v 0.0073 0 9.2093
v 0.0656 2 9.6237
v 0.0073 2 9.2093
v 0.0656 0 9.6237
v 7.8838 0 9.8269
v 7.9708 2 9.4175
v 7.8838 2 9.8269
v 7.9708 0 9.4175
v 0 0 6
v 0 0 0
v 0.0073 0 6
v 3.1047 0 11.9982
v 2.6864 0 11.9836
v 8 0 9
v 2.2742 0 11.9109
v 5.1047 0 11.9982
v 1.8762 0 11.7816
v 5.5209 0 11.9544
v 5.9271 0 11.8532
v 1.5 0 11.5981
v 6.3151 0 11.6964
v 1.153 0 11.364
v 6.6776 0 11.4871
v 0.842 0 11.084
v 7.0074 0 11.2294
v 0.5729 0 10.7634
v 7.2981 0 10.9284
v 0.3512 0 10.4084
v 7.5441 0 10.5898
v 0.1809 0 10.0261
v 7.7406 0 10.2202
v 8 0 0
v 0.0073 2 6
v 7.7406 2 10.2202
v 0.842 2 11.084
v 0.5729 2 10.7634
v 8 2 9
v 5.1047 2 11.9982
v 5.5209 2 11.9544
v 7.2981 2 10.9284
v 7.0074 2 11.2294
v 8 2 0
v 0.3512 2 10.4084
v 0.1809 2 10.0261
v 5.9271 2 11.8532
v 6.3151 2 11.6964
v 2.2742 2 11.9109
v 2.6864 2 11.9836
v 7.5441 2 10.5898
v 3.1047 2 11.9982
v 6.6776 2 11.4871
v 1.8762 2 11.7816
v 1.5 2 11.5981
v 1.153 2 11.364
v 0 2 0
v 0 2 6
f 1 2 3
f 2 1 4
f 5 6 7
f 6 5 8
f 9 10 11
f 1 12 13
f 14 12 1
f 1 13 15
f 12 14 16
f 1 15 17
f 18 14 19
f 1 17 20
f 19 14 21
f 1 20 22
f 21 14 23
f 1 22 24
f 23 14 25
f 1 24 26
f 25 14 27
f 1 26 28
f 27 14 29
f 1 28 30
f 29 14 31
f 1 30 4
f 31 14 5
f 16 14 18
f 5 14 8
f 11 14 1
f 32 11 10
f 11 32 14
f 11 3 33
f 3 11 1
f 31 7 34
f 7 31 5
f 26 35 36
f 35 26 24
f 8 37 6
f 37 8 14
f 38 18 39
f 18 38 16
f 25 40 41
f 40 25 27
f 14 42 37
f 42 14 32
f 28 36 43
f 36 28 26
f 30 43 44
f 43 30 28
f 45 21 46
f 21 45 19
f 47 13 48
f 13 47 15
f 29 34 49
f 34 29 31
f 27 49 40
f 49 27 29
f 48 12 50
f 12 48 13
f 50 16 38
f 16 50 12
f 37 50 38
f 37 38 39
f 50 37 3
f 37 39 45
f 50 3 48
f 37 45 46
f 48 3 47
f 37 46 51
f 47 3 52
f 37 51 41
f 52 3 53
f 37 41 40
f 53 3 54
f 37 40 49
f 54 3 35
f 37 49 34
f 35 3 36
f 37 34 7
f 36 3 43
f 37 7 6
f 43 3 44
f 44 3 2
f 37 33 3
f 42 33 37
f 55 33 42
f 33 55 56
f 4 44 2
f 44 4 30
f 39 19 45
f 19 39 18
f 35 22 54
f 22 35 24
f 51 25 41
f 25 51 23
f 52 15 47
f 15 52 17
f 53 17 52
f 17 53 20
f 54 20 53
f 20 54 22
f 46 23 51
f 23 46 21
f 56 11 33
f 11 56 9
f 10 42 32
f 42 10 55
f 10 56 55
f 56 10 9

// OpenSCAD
// file: const.scad
SWITCH_WIDTH = 171;
SWITCH_DEPTH = 14;
SWITCH_HEIGHT = 100;

DOCK_SLIT_WIDTH = 8;
DOCK_SLIT_DEPTH = 2;
DOCK_SLIT_HEIGHT = 12;

BACK_HOLE_WIDTH = 42;
BACK_HOLE_HEIGHT = 5;
HOLE_VERTICAL_POSITION = DOCK_SLIT_HEIGHT - BACK_HOLE_HEIGHT;
HOLE_DISTANCE_FROM_CENTER = 4 + DOCK_SLIT_WIDTH / 2;
// main file
include <./const.scad>

// @example
dockSlit();

module dockSlit() {

  r = 3;
  h = 1;

  translate([ r, h, r ])
  minkowski() {

    cube([ DOCK_SLIT_WIDTH - (r * 2), DOCK_SLIT_DEPTH - h, DOCK_SLIT_HEIGHT - (r * 2) ]);

    $fn = 45;
    rotate([ 90, 0, 0 ])
    cylinder(r = r, h = h);
  }

  cube([ DOCK_SLIT_WIDTH, DOCK_SLIT_DEPTH, DOCK_SLIT_HEIGHT - (r * 2) ]);

}
